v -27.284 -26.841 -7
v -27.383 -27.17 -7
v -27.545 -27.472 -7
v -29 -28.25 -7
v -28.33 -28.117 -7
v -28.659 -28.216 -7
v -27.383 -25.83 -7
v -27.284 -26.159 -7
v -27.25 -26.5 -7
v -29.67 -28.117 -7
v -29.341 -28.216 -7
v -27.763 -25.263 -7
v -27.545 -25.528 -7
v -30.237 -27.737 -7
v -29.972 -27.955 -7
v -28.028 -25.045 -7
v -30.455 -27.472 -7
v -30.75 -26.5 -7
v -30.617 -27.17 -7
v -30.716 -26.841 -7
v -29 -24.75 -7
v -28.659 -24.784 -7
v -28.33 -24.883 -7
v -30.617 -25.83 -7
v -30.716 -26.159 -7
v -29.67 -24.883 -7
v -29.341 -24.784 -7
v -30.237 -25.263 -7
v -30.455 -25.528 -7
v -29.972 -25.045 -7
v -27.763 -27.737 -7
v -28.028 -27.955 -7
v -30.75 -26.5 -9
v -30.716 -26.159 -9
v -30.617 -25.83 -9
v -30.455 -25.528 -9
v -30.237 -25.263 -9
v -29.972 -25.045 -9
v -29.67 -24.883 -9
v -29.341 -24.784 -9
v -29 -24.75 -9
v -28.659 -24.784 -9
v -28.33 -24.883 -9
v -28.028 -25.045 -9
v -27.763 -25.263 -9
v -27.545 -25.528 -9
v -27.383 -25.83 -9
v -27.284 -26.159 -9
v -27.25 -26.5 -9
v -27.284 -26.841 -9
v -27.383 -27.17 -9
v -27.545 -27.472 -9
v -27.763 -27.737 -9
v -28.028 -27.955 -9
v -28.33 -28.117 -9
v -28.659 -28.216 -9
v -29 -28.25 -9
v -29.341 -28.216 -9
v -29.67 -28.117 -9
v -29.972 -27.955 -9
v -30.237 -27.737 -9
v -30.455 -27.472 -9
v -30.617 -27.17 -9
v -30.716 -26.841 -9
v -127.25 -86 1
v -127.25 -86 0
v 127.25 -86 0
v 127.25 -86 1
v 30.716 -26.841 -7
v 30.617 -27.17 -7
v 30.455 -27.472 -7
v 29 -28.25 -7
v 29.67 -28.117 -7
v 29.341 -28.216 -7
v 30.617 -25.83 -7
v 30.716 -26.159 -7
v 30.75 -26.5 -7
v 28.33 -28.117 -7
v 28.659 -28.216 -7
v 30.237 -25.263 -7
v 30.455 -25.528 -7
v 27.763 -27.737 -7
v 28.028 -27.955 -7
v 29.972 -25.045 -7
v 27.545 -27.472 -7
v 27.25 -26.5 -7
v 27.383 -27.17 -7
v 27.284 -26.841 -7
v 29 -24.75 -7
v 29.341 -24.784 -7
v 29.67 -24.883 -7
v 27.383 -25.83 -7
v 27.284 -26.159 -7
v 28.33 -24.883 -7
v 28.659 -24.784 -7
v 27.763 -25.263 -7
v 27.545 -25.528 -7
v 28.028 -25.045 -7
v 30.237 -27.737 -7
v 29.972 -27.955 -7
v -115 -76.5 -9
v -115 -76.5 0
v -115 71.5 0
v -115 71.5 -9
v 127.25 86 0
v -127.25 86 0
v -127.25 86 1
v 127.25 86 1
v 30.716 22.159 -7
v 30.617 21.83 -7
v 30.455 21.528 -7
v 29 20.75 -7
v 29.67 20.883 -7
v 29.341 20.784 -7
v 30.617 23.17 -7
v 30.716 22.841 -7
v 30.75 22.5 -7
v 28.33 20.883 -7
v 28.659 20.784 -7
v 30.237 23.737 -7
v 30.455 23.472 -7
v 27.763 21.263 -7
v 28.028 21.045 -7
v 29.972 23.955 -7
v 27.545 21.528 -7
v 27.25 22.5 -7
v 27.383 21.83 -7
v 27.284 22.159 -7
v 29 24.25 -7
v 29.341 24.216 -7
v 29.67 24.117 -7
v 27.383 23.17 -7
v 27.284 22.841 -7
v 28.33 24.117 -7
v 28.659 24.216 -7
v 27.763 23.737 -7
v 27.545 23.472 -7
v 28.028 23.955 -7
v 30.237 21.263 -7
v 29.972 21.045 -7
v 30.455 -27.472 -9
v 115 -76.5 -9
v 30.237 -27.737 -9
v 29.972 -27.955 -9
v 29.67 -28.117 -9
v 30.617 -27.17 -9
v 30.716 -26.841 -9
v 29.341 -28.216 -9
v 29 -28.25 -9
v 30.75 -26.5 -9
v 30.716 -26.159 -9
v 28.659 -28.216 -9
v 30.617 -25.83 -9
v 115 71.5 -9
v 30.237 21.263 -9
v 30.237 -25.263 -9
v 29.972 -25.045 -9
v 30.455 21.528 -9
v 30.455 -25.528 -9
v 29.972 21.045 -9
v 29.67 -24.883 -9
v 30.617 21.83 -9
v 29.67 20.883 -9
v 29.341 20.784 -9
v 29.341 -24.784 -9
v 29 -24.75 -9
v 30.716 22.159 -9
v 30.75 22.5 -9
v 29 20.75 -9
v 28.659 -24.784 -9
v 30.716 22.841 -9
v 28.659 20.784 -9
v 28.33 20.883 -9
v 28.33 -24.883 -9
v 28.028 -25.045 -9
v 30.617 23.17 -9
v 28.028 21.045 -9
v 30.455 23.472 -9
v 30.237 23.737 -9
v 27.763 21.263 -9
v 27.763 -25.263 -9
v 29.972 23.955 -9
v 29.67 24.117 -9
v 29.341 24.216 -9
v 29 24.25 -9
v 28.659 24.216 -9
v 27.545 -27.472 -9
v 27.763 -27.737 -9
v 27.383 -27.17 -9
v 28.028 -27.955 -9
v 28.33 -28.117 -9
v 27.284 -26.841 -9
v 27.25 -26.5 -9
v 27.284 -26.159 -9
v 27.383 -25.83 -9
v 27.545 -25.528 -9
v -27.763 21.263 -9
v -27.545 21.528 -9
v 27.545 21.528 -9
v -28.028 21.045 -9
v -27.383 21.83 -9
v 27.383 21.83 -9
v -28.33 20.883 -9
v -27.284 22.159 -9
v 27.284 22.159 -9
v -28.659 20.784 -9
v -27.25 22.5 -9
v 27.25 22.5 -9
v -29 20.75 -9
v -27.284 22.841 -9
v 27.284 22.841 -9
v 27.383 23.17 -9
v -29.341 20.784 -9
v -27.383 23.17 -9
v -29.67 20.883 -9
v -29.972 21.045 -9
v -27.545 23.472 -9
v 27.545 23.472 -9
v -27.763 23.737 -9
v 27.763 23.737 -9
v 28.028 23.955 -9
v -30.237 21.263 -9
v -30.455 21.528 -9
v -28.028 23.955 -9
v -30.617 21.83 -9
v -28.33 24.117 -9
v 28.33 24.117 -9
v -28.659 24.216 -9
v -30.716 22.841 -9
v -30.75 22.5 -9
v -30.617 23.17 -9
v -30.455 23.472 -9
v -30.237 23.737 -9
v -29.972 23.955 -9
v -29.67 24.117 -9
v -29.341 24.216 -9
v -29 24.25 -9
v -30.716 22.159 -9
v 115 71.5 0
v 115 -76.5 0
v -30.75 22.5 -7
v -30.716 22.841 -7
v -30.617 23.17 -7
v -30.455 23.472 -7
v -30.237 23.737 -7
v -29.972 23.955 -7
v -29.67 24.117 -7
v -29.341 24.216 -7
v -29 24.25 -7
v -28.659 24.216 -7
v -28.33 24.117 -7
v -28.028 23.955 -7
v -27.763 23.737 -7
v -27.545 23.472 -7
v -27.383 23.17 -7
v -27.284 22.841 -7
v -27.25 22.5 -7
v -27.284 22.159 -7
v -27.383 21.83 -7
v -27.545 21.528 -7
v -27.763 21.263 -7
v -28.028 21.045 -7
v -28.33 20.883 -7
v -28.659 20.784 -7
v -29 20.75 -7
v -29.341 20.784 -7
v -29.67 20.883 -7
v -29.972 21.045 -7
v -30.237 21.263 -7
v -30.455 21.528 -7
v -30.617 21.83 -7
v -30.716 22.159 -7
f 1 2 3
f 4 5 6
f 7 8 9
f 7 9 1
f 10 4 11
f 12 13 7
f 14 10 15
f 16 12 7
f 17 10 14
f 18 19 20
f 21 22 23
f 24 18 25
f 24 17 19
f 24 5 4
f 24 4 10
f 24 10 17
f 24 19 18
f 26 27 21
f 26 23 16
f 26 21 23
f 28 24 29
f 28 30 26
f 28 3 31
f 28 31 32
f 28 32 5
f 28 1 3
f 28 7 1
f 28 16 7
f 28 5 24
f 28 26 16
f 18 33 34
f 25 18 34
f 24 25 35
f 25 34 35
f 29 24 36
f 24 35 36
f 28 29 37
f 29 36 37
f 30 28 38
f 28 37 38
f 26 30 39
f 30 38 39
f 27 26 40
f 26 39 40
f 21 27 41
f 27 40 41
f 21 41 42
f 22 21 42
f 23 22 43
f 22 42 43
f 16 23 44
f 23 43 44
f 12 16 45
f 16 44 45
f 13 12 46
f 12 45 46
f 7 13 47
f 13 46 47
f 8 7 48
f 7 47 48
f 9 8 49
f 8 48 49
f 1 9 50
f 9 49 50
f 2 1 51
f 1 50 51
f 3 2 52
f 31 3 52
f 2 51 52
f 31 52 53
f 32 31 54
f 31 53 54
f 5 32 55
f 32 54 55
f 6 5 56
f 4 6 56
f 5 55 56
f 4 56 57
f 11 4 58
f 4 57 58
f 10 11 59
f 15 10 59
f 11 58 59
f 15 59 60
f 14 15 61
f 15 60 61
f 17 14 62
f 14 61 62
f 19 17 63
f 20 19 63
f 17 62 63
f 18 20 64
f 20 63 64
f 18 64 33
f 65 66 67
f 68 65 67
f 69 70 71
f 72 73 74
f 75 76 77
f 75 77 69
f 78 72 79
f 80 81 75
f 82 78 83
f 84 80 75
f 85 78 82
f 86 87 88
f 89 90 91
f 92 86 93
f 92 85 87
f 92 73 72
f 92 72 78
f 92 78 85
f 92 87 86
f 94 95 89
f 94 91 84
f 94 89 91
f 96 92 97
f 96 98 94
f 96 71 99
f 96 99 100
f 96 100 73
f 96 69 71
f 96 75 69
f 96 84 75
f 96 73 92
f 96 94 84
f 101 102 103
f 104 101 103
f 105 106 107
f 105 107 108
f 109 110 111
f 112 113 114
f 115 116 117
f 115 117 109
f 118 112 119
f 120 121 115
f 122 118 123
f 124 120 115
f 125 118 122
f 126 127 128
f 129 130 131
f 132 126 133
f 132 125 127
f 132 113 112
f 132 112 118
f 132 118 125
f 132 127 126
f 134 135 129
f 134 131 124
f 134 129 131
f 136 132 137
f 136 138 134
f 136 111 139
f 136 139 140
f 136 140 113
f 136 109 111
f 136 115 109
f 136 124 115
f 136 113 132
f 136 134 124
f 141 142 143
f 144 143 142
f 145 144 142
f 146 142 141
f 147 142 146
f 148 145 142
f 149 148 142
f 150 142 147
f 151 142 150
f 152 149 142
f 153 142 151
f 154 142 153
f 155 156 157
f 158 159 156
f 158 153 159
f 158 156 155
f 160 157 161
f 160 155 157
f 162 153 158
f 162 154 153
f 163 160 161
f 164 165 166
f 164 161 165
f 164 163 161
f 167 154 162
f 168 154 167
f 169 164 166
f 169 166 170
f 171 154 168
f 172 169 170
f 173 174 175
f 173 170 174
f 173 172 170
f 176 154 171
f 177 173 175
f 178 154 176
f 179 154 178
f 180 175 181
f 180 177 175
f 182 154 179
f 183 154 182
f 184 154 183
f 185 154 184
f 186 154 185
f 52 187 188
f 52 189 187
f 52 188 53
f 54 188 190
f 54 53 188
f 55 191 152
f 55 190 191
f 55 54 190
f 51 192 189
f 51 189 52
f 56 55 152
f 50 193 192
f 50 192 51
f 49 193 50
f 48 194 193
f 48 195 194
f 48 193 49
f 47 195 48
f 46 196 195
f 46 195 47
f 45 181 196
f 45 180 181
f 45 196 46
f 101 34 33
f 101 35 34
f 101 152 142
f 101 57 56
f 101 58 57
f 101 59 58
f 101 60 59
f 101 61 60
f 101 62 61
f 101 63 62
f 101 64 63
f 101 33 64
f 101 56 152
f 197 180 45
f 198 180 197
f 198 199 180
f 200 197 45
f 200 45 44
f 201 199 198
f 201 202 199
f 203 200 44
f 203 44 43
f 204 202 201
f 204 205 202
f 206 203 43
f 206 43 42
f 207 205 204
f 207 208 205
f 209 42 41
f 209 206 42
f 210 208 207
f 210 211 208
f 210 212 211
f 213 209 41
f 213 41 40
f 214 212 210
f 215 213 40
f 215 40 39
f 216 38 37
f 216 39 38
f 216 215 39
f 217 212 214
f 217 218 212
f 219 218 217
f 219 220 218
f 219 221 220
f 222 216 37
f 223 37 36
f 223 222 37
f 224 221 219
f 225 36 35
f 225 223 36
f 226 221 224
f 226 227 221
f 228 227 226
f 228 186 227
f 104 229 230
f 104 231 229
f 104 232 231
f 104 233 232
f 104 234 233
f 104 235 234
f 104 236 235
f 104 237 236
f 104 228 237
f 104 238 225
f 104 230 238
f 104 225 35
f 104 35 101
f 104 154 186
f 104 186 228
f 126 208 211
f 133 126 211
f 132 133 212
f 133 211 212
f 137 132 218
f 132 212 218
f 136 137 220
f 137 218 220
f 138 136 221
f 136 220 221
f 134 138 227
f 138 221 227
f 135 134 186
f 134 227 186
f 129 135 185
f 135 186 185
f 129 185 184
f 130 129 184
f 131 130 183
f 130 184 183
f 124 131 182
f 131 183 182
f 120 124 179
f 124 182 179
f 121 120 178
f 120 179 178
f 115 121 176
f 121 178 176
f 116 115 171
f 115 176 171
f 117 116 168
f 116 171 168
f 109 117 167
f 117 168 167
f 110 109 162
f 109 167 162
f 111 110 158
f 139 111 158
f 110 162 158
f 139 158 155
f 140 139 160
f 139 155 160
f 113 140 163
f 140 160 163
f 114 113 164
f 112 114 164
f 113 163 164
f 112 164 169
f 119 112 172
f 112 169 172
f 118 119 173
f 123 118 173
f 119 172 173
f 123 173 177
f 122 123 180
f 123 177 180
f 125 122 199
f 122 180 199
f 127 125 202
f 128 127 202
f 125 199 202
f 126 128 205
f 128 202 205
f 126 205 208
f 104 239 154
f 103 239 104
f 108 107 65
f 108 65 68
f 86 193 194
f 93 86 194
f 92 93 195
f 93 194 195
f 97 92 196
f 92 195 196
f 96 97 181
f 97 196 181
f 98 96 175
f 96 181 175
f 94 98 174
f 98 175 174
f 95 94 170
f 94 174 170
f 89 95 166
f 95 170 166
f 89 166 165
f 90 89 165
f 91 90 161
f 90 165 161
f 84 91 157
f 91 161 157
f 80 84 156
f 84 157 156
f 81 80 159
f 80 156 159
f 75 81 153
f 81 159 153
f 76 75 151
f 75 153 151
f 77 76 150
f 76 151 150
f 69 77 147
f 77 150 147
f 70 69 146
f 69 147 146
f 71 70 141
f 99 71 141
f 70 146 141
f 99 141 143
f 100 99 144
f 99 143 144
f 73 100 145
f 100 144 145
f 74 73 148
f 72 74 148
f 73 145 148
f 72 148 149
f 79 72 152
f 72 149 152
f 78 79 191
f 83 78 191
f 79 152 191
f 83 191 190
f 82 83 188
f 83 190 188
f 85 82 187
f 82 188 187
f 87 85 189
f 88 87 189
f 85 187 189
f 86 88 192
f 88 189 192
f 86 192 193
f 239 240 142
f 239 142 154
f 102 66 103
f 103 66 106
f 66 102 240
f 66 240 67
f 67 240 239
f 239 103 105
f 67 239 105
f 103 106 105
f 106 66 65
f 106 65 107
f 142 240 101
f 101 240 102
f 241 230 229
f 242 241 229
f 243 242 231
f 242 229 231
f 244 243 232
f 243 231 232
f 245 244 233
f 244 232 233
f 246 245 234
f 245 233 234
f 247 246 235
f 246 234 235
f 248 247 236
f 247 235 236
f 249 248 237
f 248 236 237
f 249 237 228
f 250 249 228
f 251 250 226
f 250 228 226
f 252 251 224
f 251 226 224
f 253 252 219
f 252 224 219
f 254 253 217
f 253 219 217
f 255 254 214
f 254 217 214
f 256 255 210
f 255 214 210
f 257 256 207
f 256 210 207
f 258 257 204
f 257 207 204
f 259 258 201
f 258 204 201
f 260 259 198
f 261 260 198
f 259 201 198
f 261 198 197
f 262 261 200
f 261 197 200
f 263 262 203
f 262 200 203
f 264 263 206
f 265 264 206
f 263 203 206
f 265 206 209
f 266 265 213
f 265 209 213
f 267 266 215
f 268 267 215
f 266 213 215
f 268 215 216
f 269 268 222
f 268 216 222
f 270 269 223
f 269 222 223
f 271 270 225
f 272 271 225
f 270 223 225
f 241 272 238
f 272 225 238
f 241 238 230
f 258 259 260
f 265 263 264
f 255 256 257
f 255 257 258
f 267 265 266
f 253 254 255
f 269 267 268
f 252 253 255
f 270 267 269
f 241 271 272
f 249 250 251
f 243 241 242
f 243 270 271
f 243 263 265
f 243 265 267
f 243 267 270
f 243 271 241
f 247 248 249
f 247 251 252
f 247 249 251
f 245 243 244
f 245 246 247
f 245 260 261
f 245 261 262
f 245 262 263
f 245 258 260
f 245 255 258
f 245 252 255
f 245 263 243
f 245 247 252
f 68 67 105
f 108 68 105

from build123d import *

# Parameters (mm, degrees)
SKETCH1_W           = 254.5
SKETCH1_H           = 172
BOSS_EXTRUDE1_DEPTH = 1
SKETCH2_W           = 230
SKETCH2_H           = 148
BOSS_EXTRUDE2_DEPTH = 9
SKETCH3_R           = 1.75
CUT_EXTRUDE1_DEPTH  = 2


with BuildPart() as part:
    # Sketch1 → Boss-Extrude1 (new body)
    with BuildSketch(Plane.XY):
        Rectangle(SKETCH1_W, SKETCH1_H)
    extrude(amount=BOSS_EXTRUDE1_DEPTH)

    # Sketch2 → Boss-Extrude2 (add)
    with BuildSketch(Plane(origin=(0, 0, 0), x_dir=(-1, 0, 0), z_dir=(0, 0, -1))):
        with Locations((0, -2.5)):
            Rectangle(SKETCH2_W, SKETCH2_H)
    extrude(amount=BOSS_EXTRUDE2_DEPTH)

    # Sketch3 → Cut-Extrude1 (cut)
    with BuildSketch(Plane(origin=(0, 0, -9), x_dir=(-1, 0, 0), z_dir=(0, 0, -1))):
        with Locations((29, -26.5)):
            Circle(SKETCH3_R)
        with Locations((-29, -26.5)):
            Circle(SKETCH3_R)
        with Locations((-29, 22.5)):
            Circle(SKETCH3_R)
        with Locations((29, 22.5)):
            Circle(SKETCH3_R)
    extrude(amount=-CUT_EXTRUDE1_DEPTH, mode=Mode.SUBTRACT)


solid = part.part
